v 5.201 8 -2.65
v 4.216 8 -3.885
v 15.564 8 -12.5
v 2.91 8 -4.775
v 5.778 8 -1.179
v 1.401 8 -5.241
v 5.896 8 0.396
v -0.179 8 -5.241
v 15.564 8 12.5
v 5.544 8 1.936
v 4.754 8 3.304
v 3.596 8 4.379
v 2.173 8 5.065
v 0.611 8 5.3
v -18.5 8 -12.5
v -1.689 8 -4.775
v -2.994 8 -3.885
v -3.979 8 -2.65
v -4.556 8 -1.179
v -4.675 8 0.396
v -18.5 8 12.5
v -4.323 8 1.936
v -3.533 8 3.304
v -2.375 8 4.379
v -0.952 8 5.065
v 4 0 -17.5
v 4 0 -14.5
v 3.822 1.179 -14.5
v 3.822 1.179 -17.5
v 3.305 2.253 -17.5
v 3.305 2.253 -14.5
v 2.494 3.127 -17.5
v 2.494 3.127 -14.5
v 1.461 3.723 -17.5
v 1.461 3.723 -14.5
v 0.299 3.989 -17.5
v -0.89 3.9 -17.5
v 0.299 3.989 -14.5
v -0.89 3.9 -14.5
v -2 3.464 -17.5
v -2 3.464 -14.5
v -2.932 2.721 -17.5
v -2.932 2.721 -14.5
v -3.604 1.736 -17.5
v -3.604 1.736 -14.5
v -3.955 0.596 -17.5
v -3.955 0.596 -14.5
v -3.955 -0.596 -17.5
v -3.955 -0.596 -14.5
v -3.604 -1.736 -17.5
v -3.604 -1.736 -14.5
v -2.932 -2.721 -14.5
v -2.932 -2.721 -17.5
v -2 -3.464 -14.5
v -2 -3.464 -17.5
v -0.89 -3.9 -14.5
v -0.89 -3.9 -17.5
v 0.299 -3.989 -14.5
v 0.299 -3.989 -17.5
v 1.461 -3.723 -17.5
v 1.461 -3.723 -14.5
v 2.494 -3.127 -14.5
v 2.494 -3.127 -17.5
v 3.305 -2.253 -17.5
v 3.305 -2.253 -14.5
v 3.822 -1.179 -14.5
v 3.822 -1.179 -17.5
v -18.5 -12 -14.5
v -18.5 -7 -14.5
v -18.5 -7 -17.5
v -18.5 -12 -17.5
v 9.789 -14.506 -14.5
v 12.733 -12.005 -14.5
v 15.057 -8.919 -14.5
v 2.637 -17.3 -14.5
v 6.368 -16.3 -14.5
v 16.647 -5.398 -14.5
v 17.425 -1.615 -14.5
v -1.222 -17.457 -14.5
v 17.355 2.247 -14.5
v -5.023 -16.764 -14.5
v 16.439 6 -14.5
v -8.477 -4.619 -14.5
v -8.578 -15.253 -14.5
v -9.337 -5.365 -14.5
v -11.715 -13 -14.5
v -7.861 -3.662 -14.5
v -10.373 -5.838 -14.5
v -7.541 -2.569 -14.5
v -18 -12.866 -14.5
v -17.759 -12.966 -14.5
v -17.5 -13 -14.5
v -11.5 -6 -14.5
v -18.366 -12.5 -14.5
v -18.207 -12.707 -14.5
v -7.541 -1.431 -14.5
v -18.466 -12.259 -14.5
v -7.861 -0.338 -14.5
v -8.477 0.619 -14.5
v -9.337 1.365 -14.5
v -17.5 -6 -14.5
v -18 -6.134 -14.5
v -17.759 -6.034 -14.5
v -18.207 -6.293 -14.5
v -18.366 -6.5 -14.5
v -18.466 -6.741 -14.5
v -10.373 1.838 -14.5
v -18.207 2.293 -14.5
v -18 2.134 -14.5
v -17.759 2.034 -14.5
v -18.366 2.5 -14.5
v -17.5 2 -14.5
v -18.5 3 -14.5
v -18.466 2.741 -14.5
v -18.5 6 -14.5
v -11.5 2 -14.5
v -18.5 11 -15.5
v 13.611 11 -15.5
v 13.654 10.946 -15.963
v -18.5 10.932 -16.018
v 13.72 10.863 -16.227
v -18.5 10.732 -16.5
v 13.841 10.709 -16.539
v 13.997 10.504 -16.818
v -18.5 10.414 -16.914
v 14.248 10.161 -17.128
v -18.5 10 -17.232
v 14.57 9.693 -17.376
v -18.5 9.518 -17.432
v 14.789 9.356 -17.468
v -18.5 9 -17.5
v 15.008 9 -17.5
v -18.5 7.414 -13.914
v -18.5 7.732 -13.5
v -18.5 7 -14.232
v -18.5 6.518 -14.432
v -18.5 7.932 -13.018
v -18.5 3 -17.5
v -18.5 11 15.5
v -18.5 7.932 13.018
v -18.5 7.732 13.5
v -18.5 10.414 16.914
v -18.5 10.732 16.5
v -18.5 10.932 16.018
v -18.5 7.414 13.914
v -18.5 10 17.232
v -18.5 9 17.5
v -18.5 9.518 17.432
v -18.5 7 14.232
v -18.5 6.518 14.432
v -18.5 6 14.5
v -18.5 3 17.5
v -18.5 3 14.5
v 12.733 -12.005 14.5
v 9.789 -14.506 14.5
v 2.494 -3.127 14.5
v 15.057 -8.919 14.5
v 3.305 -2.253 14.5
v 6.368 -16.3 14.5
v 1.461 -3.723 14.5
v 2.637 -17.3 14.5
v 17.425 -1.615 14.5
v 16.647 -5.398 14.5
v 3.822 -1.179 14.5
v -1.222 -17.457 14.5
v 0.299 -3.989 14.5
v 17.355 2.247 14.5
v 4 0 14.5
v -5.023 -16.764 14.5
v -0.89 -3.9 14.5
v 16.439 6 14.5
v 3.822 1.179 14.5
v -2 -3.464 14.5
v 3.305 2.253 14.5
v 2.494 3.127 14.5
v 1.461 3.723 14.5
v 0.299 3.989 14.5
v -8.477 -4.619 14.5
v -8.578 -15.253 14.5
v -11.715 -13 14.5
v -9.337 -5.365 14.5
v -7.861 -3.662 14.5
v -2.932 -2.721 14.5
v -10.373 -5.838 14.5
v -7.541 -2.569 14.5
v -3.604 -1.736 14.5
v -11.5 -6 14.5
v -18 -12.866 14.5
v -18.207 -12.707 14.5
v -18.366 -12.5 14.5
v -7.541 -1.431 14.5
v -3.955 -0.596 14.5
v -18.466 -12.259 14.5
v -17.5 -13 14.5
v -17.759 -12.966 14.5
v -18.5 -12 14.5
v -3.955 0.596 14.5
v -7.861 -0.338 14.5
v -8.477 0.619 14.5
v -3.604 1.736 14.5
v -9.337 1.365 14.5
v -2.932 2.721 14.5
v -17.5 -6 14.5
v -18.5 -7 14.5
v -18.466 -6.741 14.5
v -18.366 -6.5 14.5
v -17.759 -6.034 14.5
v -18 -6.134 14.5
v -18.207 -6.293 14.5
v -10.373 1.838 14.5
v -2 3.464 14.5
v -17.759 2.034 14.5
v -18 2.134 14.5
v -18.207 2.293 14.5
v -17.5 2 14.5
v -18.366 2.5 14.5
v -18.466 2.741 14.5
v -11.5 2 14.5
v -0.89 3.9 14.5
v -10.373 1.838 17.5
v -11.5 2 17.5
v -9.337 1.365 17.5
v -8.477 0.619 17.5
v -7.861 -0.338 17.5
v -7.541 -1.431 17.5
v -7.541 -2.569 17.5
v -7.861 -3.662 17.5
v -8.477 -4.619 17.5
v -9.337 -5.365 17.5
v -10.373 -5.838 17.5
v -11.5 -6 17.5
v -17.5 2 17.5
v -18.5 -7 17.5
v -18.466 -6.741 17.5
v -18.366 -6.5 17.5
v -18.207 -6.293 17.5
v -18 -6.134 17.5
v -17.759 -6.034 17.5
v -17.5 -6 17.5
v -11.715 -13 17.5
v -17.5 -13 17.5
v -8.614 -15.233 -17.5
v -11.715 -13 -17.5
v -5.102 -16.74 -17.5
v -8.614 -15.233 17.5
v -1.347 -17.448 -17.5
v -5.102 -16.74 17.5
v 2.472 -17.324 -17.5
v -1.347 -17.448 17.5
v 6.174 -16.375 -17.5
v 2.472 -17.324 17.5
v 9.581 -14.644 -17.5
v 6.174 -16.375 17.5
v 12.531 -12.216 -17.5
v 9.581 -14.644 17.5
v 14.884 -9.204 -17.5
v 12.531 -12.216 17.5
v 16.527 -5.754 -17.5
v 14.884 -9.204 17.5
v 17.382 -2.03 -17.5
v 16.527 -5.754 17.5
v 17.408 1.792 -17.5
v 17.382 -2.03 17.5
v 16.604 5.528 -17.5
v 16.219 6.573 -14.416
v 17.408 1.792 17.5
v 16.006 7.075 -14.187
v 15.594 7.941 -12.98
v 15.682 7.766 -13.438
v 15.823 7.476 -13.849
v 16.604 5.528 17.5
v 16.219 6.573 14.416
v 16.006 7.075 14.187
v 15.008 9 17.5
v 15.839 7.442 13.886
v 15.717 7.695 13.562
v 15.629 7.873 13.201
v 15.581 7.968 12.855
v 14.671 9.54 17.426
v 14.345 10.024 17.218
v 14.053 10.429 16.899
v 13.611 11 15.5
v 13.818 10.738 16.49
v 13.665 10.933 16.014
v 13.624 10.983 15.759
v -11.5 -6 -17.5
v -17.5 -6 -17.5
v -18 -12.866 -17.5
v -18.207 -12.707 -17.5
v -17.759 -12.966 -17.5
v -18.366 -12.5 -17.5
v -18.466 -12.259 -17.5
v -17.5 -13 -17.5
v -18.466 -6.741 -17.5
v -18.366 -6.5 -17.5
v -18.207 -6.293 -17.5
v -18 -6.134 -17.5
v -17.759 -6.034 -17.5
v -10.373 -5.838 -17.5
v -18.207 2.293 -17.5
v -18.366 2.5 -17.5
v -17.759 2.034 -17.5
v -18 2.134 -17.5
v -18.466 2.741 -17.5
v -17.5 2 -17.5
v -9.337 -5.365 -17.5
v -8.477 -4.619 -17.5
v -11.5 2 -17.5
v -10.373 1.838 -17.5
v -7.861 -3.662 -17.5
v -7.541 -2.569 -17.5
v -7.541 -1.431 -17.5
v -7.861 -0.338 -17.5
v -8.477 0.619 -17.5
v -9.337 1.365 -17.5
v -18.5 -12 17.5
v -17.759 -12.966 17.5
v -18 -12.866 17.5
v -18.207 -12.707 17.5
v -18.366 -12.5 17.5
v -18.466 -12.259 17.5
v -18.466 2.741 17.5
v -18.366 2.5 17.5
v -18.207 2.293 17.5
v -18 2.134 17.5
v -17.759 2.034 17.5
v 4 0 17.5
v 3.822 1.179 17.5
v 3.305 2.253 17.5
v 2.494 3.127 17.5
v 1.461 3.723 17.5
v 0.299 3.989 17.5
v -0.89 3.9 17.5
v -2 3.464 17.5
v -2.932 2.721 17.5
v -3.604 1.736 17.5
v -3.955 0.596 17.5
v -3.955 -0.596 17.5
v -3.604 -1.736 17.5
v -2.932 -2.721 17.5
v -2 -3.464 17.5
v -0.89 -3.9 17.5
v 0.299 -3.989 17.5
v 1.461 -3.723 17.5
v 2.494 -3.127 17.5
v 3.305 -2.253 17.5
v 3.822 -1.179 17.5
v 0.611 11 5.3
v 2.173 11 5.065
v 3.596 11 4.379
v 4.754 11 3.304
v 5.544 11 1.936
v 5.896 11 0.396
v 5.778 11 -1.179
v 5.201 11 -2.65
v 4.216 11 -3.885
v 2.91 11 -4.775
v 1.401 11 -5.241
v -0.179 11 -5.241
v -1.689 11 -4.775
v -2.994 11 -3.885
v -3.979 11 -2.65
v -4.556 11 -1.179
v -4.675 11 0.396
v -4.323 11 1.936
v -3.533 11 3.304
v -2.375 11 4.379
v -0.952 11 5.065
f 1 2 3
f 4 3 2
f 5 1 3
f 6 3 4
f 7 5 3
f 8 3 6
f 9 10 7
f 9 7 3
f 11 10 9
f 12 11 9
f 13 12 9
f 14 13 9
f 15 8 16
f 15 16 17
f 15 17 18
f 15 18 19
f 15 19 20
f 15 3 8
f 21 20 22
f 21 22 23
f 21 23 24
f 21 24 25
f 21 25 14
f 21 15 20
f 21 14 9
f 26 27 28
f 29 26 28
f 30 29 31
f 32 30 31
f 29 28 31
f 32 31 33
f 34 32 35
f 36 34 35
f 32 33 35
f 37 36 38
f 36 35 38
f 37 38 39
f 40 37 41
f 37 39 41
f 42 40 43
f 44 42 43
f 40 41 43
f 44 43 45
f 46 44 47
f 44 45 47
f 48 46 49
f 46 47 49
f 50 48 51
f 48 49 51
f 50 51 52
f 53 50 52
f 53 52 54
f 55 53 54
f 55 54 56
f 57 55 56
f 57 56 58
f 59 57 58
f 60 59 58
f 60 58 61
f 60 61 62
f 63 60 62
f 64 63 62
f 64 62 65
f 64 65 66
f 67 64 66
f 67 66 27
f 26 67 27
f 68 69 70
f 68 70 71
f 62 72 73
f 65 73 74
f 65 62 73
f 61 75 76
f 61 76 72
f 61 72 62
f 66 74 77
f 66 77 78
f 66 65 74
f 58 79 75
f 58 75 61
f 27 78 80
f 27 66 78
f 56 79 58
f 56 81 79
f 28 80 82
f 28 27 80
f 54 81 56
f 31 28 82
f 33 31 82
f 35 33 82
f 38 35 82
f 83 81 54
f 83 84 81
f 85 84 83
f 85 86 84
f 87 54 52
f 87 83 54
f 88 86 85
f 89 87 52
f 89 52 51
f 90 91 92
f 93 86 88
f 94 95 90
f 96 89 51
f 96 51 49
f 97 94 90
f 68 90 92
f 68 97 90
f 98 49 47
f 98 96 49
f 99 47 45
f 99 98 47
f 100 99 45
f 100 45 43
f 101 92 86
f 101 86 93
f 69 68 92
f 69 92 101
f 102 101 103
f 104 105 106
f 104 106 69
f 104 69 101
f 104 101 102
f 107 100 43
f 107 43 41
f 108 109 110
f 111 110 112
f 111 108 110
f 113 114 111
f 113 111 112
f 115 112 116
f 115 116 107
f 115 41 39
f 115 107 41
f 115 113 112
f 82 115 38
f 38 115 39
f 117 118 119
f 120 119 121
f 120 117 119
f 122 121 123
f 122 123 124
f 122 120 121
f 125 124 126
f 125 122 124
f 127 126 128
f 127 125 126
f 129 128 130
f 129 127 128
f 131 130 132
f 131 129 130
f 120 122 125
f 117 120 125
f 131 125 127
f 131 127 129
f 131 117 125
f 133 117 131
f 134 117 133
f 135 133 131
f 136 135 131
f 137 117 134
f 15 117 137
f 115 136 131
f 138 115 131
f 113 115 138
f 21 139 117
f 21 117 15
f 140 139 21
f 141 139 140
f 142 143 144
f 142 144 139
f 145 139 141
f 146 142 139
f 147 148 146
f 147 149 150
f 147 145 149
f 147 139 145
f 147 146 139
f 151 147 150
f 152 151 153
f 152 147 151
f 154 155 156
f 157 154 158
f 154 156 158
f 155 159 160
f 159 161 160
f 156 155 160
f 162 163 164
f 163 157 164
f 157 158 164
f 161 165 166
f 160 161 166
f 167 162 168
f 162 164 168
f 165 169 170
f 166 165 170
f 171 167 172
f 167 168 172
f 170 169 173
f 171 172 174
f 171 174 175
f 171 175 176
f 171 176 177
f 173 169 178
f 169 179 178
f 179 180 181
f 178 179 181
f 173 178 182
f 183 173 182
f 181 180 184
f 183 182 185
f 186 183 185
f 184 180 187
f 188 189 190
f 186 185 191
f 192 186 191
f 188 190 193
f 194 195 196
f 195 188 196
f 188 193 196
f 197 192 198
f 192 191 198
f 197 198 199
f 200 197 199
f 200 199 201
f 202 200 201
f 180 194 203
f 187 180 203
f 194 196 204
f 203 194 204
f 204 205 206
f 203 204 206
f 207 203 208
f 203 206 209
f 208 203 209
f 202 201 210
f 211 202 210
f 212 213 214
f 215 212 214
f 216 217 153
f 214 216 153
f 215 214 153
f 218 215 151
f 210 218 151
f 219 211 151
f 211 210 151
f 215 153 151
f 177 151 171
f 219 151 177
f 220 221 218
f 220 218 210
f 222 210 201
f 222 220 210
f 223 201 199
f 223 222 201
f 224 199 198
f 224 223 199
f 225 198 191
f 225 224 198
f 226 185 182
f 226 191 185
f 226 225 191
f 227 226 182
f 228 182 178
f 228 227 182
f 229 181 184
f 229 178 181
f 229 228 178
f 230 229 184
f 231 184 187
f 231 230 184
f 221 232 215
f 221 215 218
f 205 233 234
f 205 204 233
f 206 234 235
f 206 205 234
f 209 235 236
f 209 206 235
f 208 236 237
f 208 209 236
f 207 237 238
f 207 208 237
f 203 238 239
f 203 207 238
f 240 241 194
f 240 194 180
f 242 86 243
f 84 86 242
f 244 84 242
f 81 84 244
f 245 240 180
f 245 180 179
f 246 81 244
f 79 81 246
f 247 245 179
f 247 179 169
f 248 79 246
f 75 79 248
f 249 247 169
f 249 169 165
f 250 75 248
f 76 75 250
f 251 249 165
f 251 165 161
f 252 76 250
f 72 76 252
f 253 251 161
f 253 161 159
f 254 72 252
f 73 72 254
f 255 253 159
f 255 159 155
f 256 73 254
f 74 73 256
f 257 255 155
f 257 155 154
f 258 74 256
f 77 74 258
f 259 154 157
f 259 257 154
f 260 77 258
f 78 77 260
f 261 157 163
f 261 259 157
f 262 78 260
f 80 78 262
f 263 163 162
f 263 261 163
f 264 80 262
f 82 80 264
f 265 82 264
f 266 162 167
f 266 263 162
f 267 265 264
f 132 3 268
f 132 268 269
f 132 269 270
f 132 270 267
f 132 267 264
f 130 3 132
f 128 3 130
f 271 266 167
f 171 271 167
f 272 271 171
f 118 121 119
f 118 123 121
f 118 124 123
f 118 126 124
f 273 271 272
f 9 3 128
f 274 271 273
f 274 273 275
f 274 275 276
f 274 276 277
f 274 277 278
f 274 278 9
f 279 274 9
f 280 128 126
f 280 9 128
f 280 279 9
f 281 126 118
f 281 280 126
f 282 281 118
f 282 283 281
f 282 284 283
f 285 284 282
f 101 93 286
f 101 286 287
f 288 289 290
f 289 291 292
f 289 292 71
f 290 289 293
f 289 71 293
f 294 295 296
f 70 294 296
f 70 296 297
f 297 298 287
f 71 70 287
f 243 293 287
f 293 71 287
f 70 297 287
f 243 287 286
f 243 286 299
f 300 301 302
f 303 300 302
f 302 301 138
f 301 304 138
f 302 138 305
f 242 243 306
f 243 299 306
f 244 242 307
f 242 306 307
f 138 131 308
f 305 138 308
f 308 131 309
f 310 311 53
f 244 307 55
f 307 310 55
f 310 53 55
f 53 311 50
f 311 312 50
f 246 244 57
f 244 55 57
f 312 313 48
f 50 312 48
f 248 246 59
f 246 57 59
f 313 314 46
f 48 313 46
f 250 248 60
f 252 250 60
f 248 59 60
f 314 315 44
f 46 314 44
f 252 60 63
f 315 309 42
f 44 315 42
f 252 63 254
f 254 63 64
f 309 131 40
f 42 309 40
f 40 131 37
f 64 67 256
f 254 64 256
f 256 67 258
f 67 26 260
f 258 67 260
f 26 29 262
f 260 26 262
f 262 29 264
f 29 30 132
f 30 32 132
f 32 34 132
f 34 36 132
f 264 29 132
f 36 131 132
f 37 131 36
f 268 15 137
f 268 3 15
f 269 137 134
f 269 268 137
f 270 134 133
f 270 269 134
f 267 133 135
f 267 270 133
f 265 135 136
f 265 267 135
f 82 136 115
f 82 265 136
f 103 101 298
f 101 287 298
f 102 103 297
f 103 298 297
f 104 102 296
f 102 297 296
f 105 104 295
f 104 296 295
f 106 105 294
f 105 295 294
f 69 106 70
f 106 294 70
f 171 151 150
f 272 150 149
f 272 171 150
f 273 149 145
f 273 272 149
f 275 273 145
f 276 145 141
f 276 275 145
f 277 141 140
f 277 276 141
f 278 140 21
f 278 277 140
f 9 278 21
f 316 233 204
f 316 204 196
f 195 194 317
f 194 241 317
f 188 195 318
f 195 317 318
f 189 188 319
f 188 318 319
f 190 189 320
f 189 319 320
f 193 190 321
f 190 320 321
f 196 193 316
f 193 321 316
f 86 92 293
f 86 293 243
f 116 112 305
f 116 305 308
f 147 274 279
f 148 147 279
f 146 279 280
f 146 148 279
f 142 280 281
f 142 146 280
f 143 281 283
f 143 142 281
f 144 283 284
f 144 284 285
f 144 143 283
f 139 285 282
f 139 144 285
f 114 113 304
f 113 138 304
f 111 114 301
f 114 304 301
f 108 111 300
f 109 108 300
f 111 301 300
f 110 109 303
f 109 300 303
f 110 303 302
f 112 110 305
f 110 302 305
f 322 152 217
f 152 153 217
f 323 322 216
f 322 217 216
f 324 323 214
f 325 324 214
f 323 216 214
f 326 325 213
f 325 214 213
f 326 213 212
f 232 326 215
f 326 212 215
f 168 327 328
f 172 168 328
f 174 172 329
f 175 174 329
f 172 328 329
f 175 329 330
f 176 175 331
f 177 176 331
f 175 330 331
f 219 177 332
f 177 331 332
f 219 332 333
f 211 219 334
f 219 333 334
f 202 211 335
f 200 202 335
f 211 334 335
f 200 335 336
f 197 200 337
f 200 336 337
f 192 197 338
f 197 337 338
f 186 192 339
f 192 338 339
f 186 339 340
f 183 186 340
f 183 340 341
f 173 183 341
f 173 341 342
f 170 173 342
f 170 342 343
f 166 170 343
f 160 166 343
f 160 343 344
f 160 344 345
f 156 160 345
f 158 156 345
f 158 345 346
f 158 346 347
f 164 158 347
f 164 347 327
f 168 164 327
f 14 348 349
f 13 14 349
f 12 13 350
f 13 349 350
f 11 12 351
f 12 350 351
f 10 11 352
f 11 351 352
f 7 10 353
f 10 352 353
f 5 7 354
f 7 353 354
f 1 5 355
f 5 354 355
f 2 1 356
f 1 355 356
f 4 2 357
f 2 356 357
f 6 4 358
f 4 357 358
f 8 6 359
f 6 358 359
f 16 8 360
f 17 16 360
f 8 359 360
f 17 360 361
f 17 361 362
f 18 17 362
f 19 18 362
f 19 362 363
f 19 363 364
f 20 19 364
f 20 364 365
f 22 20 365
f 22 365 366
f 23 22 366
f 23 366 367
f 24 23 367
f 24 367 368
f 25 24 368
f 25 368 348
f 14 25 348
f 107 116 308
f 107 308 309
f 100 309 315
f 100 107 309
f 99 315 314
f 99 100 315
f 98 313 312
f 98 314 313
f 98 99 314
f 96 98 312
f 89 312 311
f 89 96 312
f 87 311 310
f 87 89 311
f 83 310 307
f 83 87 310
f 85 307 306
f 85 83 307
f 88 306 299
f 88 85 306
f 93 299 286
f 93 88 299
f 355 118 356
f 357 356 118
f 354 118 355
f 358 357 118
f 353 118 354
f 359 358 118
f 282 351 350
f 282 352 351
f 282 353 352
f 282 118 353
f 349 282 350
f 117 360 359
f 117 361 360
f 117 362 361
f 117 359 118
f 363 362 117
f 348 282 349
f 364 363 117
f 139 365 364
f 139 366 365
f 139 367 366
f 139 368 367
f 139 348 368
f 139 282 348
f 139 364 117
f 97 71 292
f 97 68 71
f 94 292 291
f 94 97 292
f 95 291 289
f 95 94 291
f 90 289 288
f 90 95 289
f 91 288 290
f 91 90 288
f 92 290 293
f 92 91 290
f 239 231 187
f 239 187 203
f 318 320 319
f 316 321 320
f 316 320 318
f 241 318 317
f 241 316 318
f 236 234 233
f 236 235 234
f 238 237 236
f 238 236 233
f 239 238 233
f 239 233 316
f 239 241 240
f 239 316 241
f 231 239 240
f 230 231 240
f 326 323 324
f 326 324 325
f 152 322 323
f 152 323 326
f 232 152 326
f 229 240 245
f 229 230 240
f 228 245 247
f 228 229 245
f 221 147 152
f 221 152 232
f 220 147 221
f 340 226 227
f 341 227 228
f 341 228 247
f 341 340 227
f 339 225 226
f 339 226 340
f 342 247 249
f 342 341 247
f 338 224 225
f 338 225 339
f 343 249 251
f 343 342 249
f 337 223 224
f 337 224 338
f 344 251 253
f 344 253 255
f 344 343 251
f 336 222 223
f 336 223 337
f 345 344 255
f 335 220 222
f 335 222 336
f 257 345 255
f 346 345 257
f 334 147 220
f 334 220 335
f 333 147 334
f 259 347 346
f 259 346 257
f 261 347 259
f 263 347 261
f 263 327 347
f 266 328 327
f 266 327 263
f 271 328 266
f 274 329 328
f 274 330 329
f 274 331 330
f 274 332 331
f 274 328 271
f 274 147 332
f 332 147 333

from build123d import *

# Parameters (mm, degrees)
EXTRUDE_1_DEPTH     = 17.5
SKETCH_2_R          = 4
CUT_EXTRUDE_1_DEPTH = 44.283946216
SKETCH_3_W          = 29
SKETCH_3_H          = 25.5
CUT_EXTRUDE_2_DEPTH = 44.686382318
CUT_EXTRUDE_3_REACH = 40.22
SKETCH_4_R          = 5.3
FILLET_1_R          = 1
FILLET_2_R          = 2


with BuildPart() as part:
    # ｽｹｯﾁ1 → ﾎﾞｽ - 押し出し1 (new, symmetric)
    with BuildSketch(Plane.XY):
        with BuildLine():
            Line((-18.5, 11), (-18.5, -13))
            Line((-18.5, -13), (-11.715374514, -13))
            ThreePointArc((-11.715374514, -13), (12.037359531, -12.702439747), (13.610657589, 11))
            Line((13.610657589, 11), (-18.5, 11))
        make_face()
    extrude(amount=EXTRUDE_1_DEPTH, both=True)

    # ｽｹｯﾁ2 → ｶｯﾄ - 押し出し1 (cut, through all)
    with BuildSketch(Plane.XY.offset(17.5)):
        Circle(SKETCH_2_R)
        with BuildLine():
            Line((-18.5, 2), (-11.5, 2))
            ThreePointArc((-11.5, 2), (-7.5, -2), (-11.5, -6))
            Line((-11.5, -6), (-18.5, -6))
            Line((-18.5, -6), (-18.5, 2))
        make_face()
    extrude(amount=-CUT_EXTRUDE_1_DEPTH, mode=Mode.SUBTRACT)

    # ｽｹｯﾁ3 → ｶｯﾄ - 押し出し2 (cut, through all)
    with BuildSketch(Plane.ZY.offset(18.5)):
        with Locations((0, -4.75)):
            Rectangle(SKETCH_3_W, SKETCH_3_H)
    extrude(amount=-CUT_EXTRUDE_2_DEPTH, mode=Mode.SUBTRACT)

    # ｽｹｯﾁ4 → ｶｯﾄ - 押し出し3 (cut, up to next)
    with BuildSketch(Plane(origin=(0, 11, 0), x_dir=(1, 0, 0), z_dir=(0, 1, 0)), mode=Mode.PRIVATE) as cut_extrude_3_sk1:
        with Locations(Location((0.610657589, 0, 0), (0, 0, 270))):
            Circle(SKETCH_4_R)
    cut_extrude_3_tool1 = extrude(cut_extrude_3_sk1.sketch, amount=-CUT_EXTRUDE_3_REACH, mode=Mode.PRIVATE) & part.part
    add(cut_extrude_3_tool1.solids().sort_by_distance((0.610658, 11, 0))[0], mode=Mode.SUBTRACT)

    # ﾌｨﾚｯﾄ1
    fillet_1_edges = [part.edges().sort_by_distance(p)[0] for p in [
        (-18.5, -6, -16),
        (-18.5, 2, -16),
        (-18.5, -6, 16),
        (-18.5, 2, 16),
        (-18.5, -13, -16),
        (-18.5, -13, 16),
    ]]
    fillet(fillet_1_edges, radius=FILLET_1_R)

    # ﾌｨﾚｯﾄ2
    fillet_2_edges = [part.edges().sort_by_distance(p)[0] for p in [
        (-2.444671206, 11, 17.5),
        (-1.467808792, 8, -14.5),
        (-1.467808792, 8, 14.5),
        (-2.444671206, 11, -17.5),
    ]]
    fillet(fillet_2_edges, radius=FILLET_2_R)


solid = part.part
